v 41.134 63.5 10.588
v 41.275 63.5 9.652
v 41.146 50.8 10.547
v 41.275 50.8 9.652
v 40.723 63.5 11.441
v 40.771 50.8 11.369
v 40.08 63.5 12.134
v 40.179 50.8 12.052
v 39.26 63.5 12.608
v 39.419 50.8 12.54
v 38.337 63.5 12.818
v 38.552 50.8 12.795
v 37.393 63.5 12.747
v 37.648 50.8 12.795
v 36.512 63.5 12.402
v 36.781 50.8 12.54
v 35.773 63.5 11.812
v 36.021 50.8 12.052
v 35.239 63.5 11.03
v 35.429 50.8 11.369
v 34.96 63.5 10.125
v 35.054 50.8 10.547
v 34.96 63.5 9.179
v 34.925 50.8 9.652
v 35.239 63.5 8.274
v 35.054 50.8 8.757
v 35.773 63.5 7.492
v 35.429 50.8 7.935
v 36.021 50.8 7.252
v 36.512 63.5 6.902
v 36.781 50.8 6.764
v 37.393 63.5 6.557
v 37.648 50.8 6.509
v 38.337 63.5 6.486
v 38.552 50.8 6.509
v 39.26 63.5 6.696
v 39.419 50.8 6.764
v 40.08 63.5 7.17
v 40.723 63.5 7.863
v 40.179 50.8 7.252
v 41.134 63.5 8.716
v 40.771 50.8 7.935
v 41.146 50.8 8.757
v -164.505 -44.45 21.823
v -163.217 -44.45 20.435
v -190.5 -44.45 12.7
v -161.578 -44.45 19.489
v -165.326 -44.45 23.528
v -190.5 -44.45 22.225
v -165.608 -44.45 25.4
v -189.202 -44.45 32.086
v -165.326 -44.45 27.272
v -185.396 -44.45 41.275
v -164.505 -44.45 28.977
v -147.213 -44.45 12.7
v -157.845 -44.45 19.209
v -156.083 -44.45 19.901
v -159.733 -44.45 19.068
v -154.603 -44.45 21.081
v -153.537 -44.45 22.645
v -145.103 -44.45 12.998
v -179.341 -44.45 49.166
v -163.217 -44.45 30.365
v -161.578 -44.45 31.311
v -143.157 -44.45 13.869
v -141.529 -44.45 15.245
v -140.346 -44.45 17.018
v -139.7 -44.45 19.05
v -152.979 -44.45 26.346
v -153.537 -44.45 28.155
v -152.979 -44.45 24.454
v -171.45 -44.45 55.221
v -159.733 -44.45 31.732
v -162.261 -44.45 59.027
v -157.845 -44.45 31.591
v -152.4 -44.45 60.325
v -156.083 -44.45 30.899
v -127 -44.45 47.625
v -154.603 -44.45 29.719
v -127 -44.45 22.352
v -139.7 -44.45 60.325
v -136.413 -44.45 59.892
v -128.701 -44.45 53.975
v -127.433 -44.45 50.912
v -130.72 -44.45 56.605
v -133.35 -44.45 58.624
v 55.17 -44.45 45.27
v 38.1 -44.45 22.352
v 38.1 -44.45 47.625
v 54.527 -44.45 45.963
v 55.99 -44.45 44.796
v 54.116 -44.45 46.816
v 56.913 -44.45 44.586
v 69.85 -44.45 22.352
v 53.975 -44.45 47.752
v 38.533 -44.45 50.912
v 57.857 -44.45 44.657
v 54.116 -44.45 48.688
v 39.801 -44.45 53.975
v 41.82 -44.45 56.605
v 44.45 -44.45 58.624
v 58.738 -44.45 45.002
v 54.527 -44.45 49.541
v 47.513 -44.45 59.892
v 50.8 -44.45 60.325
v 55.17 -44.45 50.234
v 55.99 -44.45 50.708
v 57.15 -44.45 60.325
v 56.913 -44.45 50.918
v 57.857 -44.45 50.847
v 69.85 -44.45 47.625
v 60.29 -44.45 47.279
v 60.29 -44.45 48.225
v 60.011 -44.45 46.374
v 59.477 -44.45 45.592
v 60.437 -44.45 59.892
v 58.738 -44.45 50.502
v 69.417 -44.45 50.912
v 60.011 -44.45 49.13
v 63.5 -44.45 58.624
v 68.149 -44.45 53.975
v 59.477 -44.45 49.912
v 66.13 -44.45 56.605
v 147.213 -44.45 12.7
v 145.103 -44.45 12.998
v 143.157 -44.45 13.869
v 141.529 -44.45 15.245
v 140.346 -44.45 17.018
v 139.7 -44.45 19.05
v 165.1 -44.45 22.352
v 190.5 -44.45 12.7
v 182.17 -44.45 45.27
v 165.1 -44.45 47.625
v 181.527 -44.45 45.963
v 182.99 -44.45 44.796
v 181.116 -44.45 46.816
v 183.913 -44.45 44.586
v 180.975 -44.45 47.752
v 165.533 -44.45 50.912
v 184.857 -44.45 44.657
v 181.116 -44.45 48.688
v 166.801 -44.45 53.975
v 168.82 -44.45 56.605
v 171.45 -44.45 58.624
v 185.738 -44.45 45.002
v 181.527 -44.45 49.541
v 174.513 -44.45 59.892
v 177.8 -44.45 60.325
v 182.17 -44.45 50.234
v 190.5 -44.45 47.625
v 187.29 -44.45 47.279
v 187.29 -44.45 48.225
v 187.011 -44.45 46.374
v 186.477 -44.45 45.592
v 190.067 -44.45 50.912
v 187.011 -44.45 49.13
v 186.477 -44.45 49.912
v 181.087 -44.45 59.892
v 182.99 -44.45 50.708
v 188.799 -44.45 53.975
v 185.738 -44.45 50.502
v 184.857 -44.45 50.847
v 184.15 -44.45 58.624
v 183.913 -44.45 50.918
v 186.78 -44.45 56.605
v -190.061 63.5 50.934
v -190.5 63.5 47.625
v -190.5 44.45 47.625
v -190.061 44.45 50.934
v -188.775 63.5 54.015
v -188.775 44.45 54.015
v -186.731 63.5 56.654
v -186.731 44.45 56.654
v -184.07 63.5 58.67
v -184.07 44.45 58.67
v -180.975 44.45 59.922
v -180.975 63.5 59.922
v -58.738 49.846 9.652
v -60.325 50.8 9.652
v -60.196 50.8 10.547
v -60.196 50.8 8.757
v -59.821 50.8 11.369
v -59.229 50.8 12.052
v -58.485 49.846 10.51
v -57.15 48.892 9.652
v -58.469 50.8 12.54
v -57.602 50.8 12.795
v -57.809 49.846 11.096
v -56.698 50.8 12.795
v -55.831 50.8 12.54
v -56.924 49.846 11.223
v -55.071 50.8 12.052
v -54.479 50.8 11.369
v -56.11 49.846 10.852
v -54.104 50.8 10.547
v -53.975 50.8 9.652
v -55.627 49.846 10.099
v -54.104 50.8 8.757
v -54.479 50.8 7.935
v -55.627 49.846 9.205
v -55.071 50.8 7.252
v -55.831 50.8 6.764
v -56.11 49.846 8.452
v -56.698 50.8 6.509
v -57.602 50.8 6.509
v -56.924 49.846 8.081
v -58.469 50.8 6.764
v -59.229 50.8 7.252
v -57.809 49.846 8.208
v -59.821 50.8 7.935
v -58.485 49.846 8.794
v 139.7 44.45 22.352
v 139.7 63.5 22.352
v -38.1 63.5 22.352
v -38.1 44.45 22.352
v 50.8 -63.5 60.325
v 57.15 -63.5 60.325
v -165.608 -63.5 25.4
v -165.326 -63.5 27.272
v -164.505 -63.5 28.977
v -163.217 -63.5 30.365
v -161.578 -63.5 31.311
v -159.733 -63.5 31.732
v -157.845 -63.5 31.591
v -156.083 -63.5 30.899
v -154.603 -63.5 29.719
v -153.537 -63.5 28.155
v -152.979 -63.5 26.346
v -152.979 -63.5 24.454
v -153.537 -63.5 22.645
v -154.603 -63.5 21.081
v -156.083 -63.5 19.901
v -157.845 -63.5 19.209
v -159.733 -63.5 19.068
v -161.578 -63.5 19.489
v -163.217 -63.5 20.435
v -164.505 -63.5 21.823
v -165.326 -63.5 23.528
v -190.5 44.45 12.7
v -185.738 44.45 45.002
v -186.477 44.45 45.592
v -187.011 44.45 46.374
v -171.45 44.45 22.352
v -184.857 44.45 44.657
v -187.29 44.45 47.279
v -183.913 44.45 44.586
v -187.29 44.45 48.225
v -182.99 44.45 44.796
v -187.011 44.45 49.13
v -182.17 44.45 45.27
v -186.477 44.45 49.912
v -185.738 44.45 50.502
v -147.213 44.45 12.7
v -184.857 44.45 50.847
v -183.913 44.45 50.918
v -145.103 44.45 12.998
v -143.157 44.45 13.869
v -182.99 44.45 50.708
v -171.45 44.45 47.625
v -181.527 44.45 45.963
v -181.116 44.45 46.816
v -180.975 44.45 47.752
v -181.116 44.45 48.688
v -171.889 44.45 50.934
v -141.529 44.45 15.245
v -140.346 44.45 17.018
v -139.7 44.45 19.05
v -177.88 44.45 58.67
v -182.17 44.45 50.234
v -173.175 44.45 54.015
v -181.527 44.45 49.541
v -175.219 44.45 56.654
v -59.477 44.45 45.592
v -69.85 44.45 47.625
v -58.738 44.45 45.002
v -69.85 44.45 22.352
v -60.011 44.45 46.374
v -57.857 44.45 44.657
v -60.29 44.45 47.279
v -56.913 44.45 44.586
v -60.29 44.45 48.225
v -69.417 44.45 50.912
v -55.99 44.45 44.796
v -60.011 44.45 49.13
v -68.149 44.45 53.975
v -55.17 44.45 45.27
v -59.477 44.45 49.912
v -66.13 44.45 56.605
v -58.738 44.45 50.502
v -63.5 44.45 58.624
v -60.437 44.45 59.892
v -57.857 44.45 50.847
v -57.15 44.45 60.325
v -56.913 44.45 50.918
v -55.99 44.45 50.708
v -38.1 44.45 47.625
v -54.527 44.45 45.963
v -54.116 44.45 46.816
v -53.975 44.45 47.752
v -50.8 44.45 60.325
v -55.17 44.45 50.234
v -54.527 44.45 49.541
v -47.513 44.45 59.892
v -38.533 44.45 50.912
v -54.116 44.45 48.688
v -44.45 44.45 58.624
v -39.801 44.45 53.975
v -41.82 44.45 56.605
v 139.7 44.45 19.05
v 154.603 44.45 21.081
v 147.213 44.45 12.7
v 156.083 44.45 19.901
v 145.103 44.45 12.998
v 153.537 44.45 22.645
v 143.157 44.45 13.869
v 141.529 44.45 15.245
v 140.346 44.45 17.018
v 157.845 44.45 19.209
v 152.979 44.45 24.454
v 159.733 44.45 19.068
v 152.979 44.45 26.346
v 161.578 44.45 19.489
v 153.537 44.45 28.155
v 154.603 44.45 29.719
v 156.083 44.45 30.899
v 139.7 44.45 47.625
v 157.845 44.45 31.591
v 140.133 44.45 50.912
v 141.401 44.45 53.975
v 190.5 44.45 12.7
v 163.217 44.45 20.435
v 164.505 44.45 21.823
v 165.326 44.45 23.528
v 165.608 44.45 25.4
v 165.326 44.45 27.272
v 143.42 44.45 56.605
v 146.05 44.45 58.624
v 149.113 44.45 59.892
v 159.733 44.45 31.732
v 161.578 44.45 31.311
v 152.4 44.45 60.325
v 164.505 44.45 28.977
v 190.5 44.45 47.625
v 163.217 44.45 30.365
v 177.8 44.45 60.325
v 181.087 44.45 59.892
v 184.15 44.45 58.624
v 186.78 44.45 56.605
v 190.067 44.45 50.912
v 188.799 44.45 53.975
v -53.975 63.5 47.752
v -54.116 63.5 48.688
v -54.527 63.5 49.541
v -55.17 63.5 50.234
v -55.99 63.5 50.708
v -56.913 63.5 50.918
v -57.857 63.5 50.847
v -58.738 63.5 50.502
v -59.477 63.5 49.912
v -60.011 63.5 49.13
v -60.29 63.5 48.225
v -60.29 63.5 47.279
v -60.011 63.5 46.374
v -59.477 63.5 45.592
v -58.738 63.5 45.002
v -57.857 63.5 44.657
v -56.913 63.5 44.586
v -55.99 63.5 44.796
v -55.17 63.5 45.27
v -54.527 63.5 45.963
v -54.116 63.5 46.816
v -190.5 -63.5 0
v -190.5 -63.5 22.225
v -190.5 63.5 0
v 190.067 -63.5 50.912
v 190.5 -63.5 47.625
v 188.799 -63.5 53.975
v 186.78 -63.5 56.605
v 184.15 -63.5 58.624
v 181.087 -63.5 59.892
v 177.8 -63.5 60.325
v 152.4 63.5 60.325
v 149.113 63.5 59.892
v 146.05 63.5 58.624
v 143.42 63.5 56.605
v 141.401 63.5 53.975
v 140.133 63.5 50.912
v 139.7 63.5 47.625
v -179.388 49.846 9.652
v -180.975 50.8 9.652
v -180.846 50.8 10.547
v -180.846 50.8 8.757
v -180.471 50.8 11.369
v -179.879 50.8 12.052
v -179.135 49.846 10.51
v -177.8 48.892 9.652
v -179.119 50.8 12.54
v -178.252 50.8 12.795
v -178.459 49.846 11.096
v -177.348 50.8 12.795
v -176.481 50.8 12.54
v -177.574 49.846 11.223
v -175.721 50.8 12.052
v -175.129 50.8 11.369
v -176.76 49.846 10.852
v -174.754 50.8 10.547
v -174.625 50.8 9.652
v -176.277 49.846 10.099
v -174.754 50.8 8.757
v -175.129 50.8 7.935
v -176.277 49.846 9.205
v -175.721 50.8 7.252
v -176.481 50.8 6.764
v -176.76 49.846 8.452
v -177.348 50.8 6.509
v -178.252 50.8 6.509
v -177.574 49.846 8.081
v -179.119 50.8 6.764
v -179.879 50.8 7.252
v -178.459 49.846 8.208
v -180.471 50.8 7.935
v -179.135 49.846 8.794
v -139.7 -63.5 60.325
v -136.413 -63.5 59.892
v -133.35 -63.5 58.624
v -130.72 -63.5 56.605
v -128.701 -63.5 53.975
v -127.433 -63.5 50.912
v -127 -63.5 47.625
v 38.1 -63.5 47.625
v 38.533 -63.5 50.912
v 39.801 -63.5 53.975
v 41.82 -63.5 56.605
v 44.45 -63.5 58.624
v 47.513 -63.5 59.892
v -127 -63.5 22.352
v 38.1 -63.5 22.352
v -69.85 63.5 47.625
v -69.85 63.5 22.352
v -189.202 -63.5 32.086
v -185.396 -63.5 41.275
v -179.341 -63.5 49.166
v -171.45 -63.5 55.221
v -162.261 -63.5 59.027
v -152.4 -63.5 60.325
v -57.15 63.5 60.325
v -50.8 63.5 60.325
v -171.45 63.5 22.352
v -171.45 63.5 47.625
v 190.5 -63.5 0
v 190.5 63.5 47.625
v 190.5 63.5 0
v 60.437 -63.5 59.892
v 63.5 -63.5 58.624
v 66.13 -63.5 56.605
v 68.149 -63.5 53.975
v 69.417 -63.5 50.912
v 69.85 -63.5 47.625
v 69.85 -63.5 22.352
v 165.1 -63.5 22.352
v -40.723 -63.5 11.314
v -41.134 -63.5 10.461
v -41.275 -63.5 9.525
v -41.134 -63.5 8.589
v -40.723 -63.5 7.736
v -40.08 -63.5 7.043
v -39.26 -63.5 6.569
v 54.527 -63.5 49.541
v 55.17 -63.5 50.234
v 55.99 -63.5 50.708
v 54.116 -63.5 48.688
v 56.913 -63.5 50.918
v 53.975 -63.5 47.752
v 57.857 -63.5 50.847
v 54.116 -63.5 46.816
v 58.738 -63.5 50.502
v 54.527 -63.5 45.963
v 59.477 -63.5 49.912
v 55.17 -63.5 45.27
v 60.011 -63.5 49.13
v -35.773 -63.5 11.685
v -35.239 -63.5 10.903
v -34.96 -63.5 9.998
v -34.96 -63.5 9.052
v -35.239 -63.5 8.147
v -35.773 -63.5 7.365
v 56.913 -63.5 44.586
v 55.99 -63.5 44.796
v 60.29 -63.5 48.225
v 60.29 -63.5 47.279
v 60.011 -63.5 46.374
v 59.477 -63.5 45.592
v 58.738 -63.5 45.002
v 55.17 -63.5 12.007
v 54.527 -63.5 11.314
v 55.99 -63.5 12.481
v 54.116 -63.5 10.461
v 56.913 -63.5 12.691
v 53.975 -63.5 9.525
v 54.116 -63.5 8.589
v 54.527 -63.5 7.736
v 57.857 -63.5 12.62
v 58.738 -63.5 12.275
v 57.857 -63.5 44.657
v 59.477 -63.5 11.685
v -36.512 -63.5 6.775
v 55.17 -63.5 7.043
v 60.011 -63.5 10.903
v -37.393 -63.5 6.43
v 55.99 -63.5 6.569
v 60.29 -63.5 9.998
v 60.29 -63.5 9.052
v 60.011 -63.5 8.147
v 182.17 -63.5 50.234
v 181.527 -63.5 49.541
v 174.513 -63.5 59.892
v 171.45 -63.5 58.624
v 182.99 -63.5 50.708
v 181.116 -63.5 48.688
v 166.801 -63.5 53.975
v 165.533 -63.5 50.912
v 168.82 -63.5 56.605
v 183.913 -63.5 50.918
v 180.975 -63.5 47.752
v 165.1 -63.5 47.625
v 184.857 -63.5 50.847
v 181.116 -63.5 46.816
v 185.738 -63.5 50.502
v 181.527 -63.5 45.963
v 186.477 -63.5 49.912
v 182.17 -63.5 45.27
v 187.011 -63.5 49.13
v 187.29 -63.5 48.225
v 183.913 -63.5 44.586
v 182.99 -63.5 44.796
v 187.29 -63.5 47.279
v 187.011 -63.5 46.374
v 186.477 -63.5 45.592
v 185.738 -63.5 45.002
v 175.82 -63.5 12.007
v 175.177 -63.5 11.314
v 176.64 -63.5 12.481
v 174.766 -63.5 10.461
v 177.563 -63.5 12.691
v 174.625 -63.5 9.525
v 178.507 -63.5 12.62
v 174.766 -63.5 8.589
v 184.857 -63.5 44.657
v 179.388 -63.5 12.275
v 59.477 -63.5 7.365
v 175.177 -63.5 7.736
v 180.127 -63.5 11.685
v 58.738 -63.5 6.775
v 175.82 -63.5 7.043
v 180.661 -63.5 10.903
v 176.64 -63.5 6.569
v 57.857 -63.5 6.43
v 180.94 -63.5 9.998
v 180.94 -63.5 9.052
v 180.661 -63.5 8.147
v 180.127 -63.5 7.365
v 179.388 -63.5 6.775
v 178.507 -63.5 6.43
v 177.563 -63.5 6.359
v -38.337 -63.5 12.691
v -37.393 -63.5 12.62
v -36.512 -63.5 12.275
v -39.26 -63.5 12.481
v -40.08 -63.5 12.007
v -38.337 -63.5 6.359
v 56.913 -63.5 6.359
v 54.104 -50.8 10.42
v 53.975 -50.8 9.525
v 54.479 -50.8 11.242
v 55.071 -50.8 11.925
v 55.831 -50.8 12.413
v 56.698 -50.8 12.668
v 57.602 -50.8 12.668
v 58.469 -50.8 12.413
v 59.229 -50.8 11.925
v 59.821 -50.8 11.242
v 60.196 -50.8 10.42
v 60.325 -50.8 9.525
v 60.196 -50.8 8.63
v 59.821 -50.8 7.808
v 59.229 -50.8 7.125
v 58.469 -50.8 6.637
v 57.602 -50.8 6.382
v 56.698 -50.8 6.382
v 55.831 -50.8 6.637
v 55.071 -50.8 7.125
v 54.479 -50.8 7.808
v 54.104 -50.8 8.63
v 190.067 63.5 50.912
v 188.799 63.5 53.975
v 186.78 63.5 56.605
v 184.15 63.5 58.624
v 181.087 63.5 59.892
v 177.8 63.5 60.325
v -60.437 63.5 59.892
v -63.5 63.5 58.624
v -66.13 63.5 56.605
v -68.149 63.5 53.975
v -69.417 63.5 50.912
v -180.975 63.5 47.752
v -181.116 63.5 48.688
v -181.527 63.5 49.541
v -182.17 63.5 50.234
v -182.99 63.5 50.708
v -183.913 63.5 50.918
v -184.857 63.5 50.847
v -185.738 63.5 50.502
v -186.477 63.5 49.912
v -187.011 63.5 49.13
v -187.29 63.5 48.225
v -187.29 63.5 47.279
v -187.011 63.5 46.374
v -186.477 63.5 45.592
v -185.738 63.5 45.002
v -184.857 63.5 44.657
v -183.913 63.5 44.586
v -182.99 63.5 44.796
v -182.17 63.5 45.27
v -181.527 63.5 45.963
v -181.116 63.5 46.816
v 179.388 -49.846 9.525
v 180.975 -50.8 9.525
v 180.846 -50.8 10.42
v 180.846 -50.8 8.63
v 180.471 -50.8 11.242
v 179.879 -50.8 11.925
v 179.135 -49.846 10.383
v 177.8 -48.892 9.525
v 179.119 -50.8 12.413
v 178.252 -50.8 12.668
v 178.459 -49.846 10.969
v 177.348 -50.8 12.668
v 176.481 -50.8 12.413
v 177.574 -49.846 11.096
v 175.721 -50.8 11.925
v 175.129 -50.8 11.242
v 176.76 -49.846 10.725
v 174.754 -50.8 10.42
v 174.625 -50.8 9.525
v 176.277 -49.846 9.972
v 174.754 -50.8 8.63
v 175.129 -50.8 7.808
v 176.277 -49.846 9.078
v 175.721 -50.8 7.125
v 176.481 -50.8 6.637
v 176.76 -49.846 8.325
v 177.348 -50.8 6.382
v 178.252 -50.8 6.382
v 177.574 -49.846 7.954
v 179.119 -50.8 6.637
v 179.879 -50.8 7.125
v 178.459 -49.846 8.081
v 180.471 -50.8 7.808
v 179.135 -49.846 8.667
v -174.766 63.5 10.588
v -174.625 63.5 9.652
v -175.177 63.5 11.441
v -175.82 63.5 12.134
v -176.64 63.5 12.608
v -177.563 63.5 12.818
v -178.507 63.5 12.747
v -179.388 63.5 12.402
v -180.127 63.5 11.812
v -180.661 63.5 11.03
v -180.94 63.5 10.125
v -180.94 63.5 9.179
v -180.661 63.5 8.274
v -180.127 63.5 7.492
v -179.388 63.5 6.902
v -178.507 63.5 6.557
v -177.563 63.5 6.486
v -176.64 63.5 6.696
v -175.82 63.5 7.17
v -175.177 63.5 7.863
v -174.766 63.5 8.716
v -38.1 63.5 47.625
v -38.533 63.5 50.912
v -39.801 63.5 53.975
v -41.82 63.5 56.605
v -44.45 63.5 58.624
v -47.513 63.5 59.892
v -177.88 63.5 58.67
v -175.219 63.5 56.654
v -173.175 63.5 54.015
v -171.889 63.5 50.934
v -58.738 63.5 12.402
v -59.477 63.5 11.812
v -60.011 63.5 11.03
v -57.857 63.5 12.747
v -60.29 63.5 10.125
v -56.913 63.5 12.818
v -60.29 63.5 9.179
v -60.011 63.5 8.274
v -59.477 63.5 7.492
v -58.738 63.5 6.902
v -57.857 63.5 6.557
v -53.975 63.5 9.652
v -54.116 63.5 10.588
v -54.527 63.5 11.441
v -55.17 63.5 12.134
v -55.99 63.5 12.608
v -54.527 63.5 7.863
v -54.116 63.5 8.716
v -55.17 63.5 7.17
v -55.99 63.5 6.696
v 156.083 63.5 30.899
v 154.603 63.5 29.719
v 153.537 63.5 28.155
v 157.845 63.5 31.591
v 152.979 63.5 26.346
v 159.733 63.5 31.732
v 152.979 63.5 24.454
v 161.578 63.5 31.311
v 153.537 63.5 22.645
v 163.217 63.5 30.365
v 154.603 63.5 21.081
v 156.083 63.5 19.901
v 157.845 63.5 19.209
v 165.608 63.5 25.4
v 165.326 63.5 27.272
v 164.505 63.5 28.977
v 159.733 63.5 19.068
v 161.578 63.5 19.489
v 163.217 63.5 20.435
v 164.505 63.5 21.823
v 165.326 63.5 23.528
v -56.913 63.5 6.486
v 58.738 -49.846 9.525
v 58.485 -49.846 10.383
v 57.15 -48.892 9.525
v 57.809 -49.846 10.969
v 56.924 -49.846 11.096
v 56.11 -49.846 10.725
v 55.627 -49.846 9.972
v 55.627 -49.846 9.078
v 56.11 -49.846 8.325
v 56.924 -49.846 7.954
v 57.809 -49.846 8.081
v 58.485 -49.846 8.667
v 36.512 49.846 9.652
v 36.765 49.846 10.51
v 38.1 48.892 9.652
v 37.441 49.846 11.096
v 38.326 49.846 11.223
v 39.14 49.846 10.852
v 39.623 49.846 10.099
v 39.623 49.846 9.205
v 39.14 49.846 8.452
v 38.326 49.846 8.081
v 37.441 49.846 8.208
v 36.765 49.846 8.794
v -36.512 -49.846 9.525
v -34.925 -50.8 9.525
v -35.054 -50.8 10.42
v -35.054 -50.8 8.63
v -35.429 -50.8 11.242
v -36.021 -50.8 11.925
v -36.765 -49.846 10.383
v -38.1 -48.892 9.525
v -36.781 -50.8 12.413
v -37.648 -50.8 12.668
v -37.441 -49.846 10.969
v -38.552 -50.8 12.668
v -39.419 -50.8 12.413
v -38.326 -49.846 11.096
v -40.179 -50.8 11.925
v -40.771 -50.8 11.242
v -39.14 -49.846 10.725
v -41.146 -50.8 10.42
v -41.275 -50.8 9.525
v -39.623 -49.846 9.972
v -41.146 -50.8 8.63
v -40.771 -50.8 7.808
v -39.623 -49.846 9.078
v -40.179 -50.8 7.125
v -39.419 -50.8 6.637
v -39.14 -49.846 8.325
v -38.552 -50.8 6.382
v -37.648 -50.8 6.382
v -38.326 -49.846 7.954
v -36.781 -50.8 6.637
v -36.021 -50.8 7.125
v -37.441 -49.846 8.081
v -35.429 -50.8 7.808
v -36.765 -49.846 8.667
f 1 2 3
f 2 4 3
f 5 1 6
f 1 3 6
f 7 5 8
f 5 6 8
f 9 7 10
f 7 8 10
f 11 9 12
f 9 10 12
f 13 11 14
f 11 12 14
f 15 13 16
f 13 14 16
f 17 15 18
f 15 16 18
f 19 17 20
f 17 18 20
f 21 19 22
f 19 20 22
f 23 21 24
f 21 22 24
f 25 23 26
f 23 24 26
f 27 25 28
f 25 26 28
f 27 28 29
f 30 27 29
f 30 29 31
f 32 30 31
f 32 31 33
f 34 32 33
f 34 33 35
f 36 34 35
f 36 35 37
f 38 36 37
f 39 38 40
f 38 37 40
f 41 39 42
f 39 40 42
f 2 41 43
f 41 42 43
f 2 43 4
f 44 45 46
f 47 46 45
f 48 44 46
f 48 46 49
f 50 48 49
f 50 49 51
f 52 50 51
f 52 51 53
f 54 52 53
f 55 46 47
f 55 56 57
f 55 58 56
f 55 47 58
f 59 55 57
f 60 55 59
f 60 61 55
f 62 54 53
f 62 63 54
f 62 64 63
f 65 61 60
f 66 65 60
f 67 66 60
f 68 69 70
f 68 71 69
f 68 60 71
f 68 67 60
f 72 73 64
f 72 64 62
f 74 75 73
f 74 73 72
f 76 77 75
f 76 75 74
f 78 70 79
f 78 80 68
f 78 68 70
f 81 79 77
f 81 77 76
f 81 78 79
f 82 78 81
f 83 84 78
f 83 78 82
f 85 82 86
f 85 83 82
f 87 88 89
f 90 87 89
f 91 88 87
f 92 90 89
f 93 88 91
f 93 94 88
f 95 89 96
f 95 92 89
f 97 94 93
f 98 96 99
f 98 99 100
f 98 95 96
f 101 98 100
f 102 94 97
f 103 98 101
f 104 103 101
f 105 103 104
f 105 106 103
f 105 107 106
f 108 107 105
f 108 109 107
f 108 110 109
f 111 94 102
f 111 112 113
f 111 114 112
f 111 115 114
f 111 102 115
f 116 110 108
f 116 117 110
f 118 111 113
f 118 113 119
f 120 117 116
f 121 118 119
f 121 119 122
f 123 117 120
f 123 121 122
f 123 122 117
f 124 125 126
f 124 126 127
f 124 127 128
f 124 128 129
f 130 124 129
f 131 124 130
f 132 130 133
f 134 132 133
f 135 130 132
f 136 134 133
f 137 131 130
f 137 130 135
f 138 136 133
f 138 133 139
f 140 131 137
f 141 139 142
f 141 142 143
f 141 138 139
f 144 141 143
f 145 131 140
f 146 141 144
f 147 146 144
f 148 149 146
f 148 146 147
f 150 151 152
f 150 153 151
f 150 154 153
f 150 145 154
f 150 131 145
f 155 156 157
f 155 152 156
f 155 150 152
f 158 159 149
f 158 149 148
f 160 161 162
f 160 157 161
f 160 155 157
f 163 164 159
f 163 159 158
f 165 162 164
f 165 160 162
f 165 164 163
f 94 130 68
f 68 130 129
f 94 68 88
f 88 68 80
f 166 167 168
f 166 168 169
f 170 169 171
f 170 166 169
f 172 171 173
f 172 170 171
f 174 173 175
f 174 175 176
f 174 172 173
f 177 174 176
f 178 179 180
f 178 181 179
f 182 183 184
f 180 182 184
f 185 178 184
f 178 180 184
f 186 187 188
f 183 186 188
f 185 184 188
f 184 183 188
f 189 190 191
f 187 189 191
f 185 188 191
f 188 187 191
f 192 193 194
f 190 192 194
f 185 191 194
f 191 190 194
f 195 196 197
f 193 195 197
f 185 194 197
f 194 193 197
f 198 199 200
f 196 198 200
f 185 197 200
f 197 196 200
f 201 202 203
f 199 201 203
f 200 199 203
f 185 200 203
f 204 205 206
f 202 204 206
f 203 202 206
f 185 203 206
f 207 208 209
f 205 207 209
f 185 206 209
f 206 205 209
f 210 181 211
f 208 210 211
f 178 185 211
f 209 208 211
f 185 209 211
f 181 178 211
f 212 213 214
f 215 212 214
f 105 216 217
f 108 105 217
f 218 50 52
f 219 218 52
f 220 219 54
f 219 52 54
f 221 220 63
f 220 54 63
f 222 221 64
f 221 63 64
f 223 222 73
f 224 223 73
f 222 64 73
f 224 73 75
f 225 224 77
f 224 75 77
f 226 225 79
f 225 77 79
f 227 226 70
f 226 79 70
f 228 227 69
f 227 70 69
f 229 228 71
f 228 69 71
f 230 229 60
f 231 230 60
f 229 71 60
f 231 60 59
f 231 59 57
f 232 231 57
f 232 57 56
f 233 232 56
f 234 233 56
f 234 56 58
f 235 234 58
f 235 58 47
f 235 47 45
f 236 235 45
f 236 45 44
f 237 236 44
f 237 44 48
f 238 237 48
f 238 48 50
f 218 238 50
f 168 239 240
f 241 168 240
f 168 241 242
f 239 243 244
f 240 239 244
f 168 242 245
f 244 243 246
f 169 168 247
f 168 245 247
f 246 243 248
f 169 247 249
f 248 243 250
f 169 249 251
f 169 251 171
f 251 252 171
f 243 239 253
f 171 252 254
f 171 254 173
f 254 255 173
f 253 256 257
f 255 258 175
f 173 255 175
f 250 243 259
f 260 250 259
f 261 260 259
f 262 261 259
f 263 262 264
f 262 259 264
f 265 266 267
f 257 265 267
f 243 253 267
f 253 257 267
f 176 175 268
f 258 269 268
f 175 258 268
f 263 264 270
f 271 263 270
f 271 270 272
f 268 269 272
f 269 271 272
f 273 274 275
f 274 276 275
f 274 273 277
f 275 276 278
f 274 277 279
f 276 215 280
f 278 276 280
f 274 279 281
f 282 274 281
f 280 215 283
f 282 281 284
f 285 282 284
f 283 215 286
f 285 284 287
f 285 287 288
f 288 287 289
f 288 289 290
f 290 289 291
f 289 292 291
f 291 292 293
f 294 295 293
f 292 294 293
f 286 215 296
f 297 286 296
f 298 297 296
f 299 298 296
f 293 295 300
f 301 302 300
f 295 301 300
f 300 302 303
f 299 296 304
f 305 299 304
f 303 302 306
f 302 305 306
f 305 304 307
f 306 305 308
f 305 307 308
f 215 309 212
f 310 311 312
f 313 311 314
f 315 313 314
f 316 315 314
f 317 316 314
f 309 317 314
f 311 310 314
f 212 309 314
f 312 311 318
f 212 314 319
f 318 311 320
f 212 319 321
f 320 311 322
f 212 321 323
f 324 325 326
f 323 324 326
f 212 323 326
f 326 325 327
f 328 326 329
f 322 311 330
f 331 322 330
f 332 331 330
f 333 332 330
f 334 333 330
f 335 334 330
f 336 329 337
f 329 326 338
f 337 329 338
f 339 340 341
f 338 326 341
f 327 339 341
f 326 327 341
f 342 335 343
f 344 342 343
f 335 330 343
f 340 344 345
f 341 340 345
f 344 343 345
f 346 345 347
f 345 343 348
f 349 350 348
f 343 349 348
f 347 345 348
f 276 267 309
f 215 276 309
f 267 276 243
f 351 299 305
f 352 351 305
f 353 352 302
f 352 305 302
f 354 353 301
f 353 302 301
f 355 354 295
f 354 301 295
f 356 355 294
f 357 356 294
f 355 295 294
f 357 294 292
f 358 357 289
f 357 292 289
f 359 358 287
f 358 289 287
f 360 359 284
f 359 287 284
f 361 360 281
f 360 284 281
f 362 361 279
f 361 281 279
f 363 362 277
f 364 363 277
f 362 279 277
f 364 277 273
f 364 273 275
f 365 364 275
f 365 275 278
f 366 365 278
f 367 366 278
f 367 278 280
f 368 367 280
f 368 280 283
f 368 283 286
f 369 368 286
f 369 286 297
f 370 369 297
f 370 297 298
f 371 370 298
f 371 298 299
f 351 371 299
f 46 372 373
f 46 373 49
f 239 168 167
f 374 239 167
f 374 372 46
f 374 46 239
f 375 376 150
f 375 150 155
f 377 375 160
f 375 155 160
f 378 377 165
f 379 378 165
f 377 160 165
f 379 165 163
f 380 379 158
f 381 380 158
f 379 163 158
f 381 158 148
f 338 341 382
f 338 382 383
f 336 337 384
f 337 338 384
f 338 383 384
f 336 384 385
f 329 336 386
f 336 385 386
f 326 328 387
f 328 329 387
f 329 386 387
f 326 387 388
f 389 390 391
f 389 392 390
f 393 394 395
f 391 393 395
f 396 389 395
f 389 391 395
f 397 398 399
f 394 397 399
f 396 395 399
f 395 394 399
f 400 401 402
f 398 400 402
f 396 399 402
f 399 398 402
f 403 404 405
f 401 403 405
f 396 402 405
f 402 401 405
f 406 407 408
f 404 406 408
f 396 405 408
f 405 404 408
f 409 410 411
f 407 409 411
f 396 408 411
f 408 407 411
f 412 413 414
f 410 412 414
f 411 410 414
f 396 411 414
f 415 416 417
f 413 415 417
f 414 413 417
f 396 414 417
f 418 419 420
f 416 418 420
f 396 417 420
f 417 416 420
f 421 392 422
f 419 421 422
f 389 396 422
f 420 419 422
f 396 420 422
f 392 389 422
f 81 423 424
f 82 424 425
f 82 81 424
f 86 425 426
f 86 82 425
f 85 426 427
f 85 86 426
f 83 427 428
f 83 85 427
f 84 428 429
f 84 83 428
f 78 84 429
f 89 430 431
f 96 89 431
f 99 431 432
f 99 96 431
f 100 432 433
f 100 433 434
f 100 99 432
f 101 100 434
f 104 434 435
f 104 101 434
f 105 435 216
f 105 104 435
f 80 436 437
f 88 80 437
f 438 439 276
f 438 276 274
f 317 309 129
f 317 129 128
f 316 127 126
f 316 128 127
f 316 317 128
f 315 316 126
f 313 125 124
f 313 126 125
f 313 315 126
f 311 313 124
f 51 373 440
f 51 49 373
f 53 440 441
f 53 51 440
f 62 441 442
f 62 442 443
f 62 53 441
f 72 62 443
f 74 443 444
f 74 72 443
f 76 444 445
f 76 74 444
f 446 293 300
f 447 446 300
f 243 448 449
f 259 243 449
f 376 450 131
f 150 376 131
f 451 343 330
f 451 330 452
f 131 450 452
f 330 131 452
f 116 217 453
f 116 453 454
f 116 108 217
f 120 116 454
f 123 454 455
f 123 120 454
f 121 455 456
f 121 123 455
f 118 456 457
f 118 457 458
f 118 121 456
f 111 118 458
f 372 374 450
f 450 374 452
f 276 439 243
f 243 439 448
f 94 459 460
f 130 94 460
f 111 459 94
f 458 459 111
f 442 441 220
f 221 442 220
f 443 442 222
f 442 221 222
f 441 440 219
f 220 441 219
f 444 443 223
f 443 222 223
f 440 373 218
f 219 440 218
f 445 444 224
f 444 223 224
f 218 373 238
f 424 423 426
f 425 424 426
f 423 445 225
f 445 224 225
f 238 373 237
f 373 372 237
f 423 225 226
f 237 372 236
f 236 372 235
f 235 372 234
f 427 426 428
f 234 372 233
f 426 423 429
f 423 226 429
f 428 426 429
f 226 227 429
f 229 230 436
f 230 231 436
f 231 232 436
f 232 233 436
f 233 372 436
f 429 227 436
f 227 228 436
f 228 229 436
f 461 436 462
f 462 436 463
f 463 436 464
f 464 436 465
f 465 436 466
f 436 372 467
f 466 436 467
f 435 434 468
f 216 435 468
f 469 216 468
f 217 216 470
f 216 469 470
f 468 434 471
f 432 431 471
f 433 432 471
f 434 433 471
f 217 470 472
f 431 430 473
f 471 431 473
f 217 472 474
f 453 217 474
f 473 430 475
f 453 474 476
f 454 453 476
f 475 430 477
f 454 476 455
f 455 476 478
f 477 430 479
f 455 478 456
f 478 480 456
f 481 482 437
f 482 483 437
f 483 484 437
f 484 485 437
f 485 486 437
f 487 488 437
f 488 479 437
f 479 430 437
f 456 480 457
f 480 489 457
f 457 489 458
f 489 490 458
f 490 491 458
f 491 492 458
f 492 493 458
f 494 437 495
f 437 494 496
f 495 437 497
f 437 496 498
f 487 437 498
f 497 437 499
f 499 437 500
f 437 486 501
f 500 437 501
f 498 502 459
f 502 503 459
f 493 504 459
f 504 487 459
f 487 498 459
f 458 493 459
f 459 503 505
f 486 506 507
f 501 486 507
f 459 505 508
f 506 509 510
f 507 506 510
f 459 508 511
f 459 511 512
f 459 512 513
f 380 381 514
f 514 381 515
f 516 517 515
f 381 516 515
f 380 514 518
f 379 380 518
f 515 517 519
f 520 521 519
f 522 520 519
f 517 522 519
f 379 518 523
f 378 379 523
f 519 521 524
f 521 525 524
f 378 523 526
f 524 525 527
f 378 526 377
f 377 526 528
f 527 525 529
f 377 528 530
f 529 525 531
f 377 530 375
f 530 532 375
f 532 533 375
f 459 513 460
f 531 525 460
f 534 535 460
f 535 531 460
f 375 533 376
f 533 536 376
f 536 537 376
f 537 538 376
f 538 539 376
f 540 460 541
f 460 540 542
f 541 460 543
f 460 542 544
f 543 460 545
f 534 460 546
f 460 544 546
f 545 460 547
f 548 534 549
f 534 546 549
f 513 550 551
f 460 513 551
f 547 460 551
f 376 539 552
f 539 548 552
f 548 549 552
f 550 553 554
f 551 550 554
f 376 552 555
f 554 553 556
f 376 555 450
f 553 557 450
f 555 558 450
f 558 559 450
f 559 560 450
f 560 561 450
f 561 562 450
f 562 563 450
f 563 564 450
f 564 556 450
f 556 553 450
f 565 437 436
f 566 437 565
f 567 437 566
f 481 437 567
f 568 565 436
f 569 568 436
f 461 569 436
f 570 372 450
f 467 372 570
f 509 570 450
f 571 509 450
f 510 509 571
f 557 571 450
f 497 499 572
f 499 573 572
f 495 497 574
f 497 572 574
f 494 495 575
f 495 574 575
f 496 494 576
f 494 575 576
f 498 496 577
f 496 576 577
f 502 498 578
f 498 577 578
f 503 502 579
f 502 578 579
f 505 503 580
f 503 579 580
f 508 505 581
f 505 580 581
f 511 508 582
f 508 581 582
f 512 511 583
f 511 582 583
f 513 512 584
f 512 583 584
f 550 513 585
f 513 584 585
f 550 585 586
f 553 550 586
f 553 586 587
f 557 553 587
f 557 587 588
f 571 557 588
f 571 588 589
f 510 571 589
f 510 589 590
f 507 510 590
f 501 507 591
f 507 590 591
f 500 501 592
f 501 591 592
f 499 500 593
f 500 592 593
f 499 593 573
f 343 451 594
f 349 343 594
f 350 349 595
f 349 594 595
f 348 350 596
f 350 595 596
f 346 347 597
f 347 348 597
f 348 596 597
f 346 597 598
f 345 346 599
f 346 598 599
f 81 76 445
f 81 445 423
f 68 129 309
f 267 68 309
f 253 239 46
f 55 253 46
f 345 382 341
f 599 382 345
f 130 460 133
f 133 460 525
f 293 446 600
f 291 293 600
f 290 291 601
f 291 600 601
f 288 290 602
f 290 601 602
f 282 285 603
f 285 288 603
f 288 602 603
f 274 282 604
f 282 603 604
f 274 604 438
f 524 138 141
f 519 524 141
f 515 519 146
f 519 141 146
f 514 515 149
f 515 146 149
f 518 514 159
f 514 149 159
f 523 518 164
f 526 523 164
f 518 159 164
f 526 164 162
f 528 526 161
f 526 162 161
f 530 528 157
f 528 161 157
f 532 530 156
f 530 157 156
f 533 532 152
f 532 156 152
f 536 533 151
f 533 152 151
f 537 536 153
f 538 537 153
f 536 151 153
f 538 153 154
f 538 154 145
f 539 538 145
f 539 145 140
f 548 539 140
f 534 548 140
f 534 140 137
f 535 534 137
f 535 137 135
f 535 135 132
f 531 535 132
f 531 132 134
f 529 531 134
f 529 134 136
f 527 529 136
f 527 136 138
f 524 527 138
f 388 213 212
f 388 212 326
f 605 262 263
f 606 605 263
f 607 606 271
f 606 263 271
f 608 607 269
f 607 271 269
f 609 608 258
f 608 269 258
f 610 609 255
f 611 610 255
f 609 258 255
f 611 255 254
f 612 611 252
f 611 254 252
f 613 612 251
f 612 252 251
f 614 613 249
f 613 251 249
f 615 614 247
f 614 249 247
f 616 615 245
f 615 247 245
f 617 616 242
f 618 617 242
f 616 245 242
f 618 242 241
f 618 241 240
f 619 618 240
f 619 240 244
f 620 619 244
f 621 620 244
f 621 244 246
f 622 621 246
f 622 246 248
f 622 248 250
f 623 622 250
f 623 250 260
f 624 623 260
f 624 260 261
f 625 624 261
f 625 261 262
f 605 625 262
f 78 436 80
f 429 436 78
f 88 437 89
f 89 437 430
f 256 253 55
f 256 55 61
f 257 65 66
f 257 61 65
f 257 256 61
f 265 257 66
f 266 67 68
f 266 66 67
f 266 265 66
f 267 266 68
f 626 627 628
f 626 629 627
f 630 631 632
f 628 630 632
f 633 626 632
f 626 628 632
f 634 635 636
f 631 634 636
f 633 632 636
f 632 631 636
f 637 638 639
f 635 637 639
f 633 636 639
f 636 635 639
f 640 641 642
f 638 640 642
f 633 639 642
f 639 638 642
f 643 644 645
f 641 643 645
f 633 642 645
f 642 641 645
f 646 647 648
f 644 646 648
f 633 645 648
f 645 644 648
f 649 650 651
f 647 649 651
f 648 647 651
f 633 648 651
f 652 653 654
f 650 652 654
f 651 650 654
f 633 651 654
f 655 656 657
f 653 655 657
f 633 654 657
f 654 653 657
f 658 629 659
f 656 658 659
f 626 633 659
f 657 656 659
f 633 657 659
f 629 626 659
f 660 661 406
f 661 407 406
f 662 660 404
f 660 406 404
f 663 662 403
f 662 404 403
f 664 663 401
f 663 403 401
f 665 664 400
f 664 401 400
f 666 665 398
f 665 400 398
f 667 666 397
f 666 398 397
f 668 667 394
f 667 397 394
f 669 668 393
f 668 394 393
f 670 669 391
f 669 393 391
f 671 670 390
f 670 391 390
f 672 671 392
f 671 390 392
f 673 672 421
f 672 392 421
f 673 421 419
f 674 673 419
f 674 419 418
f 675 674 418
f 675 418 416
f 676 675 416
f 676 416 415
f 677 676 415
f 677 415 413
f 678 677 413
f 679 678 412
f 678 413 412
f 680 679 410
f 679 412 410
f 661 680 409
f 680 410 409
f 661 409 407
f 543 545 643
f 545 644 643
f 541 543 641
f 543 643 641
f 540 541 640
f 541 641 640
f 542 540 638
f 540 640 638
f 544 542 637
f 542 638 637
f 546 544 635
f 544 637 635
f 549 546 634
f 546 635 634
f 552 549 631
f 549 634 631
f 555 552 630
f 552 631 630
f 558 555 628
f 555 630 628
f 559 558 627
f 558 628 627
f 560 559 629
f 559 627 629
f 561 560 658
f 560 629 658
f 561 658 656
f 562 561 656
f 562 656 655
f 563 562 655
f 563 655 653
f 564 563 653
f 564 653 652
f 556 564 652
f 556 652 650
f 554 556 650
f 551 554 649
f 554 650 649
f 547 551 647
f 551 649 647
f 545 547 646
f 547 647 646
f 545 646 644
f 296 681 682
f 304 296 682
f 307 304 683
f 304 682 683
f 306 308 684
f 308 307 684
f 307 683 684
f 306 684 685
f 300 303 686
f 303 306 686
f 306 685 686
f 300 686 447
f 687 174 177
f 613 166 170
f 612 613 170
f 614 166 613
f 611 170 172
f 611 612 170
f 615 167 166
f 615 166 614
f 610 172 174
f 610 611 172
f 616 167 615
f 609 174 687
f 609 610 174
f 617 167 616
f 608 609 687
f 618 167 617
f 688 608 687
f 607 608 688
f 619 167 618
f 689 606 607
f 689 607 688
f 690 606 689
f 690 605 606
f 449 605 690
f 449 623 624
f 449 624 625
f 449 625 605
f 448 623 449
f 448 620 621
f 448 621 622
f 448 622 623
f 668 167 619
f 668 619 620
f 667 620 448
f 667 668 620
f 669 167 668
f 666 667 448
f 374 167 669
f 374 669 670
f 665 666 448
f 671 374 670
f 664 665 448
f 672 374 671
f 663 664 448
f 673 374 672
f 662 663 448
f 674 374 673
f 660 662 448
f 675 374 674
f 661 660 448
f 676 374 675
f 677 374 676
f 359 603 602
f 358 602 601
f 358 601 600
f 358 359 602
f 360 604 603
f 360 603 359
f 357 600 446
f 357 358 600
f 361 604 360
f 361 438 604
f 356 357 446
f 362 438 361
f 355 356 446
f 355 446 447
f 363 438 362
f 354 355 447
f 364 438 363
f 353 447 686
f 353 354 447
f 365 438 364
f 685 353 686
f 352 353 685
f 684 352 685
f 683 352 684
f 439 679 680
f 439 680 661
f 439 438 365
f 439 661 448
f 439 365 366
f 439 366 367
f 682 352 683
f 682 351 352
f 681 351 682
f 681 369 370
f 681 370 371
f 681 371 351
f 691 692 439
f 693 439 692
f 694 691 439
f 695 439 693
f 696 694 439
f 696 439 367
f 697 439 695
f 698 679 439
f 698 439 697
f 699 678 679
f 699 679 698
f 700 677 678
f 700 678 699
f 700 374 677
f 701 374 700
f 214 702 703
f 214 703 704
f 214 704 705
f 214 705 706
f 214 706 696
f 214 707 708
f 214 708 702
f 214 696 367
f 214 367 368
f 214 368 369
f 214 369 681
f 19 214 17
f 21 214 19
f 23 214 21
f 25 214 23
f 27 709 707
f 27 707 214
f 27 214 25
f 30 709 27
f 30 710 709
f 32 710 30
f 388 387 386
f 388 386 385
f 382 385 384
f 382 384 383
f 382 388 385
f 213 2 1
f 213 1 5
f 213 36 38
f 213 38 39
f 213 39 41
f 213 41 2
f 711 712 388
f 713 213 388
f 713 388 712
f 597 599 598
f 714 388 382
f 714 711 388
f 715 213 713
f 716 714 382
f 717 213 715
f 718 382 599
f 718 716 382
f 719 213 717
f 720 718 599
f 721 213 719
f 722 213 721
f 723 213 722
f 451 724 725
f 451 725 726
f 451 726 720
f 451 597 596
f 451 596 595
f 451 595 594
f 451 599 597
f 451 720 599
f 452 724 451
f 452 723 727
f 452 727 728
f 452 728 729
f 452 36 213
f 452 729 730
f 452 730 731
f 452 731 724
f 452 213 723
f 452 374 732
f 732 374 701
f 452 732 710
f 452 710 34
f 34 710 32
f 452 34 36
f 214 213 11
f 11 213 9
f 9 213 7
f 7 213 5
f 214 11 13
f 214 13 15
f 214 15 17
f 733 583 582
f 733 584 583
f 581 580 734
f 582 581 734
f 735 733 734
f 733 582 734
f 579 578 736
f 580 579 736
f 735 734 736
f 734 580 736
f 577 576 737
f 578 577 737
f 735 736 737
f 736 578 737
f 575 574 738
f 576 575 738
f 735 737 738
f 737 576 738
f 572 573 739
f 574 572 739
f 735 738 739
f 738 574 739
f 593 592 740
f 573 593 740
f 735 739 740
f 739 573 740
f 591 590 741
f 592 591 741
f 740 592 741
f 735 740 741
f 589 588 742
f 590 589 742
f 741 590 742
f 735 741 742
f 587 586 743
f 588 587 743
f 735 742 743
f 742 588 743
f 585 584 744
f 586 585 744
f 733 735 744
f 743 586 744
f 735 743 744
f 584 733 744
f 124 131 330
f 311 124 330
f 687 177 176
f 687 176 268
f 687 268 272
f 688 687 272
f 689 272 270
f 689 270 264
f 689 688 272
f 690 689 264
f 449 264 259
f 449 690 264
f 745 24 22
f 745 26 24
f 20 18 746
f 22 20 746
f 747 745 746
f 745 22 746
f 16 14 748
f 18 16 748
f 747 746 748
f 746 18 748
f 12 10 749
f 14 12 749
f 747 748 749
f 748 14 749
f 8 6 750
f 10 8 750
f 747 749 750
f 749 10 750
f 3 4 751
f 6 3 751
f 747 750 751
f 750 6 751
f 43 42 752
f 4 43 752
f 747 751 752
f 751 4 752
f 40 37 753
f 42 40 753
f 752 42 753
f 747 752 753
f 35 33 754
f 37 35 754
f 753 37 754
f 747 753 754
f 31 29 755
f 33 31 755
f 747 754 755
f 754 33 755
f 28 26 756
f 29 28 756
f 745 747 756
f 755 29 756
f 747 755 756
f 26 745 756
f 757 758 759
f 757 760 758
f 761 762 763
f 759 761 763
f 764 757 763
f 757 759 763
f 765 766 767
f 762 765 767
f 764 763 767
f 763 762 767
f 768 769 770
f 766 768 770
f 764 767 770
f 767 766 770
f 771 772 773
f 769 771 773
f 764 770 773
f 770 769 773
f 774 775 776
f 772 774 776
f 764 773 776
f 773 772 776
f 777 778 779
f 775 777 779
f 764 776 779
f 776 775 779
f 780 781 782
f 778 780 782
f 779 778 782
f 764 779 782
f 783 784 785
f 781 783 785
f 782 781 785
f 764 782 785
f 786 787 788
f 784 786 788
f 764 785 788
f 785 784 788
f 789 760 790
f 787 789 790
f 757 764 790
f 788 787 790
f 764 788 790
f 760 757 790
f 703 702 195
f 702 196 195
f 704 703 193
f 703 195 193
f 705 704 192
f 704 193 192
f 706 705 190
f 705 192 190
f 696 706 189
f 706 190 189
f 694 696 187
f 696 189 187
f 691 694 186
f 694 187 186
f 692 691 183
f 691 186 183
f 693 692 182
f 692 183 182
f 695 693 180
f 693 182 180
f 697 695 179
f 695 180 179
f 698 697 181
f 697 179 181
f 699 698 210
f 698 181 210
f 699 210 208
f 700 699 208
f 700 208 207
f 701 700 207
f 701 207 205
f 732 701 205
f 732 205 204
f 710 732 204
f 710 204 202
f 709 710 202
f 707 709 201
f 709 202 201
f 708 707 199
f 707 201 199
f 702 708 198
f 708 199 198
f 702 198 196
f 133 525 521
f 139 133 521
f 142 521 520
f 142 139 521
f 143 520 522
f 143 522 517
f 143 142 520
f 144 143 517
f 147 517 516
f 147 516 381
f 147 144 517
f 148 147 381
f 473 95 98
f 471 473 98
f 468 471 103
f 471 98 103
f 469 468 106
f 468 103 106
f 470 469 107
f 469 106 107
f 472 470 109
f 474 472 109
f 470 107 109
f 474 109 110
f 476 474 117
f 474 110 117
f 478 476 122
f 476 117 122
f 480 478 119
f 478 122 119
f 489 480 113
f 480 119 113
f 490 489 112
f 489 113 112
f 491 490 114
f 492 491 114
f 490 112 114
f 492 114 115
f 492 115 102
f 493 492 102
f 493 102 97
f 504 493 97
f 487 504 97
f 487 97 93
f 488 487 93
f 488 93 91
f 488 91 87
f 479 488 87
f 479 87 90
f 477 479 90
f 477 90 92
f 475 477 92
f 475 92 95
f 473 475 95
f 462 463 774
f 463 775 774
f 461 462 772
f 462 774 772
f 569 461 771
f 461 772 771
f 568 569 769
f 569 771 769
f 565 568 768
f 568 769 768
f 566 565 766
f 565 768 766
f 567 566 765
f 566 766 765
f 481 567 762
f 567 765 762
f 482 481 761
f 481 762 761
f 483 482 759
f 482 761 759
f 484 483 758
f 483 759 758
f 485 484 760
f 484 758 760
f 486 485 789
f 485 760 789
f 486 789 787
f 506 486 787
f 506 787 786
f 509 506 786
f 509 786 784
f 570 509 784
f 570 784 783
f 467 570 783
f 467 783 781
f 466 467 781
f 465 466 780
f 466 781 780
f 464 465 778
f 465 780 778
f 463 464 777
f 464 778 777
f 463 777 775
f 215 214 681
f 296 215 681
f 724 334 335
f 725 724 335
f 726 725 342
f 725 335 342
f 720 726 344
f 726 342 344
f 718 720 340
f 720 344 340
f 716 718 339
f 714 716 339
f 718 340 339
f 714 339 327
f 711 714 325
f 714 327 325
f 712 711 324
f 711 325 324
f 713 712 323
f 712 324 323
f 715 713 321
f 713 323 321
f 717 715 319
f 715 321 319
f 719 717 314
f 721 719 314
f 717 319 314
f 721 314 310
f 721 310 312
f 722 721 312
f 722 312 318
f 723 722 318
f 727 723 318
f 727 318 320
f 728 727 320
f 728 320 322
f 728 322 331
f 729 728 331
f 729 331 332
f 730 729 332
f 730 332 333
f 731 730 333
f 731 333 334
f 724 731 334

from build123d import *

# Parameters (mm, degrees)
F0_W         = 381
F0_H         = 127
F1_DEPTH     = 60.325
F2_W         = 88.9
F2_H         = 41.275
F3_DEPTH     = 381
F4_W         = 88.9
F4_H         = 6.35
F5_DEPTH     = 50.8
F6_T1_DEPTH  = 126.4671066227
F7_W         = 88.9
F7_H         = 6.35
F8_DEPTH     = 50.8
F9_T1_DEPTH  = 126.4671066227
F10_W        = 165.1
F10_H        = 37.973
F10_W_2      = 95.25
F11_DEPTH    = 19.05
F12_W        = 177.8
F12_H        = 37.973
F12_W_2      = 101.6
F13_DEPTH    = 19.05
F14_R        = 38.1
F15_R        = 12.69999
F16_T1_DEPTH = 82.55
F18_D        = 6.35
F18_DEPTH    = 12.7
F18_TIP      = 1.9077324654
F19_D        = 6.35
F19_DEPTH    = 25.4
F19_TIP      = 1.9077324654
F20_D        = 12.7
F20_DEPTH    = 25.4
F20_TIP      = 3.8154649308
F22_D        = 12.7
F22_DEPTH    = 25.4
F22_TIP      = 3.8154649308
F23_D        = 6.35
F23_DEPTH    = 12.7
F23_TIP      = 1.9077324654
F24_D        = 6.35
F24_DEPTH    = 25.4
F24_TIP      = 1.9077324654


# Not quite as in the source:
# - a fillet or chamfer that OpenCascade refuses, or shapes differently, is made with other operations: its cross-section is extruded or revolved along the edge and cut away or added
# - a fillet or chamfer is up to 0.001 mm smaller than in the source, because OpenCascade refuses the exact size


with BuildPart() as f1:
    # F0 (on Top) → F1 (new body)
    with BuildSketch(Plane.XY):
        Rectangle(F0_W, F0_H)
    extrude(amount=F1_DEPTH)

    # F2 (on face) → F3 (cut, through all)
    with BuildSketch(Plane.YZ.offset(190.5)):
        with Locations((0, 39.6875)):
            Rectangle(F2_W, F2_H)
    extrude(amount=-F3_DEPTH, mode=Mode.SUBTRACT)

    # F4 (on face) → F5 (cut)
    with BuildSketch(Plane.YZ.offset(190.5)):
        with Locations((0, 15.875)):
            Rectangle(F4_W, F4_H)
    extrude(amount=-F5_DEPTH, mode=Mode.SUBTRACT)

    # F6: fillet of radius 7.62 on 1 edges, made by hand

    # F6_s2 → F6_t1 (join)
    with BuildSketch(Plane.XZ.offset(-63.2335533113)):
        with BuildLine():
            ThreePointArc((139.7, 19.05), (142.2947324749, 14.5001288674), (147.2134213245, 12.7))
            Line((147.2134213245, 12.7), (139.7, 12.7))
            Line((139.7, 12.7), (139.7, 19.05))
        make_face()
    extrude(amount=F6_T1_DEPTH)

    # F7 (on face) → F8 (cut)
    with BuildSketch(Plane(origin=(-190.5, 0, 0), x_dir=(0, -1, 0), z_dir=(-1, 0, 0))):
        with Locations((0, 15.875)):
            Rectangle(F7_W, F7_H)
    extrude(amount=-F8_DEPTH, mode=Mode.SUBTRACT)

    # F9: fillet of radius 7.62 on 1 edges, made by hand

    # F9_s2 → F9_t1 (join)
    with BuildSketch(Plane.XZ.offset(-63.2335533113)):
        with BuildLine():
            ThreePointArc((-147.2134213245, 12.7), (-142.2947324749, 14.5001288674), (-139.7, 19.05))
            Line((-139.7, 19.05), (-139.7, 12.7))
            Line((-139.7, 12.7), (-147.2134213245, 12.7))
        make_face()
    extrude(amount=F9_T1_DEPTH)

    # F10 (on face) → F11 (cut, through all)
    with BuildSketch(Plane.XZ.offset(63.5)):
        with Locations((-44.45, 41.3385)):
            Rectangle(F10_W, F10_H)
        with Locations((117.475, 41.3385)):
            Rectangle(F10_W_2, F10_H)
    extrude(amount=-F11_DEPTH, mode=Mode.SUBTRACT)

    # F12 (on face) → F13 (cut, through all)
    with BuildSketch(Plane(origin=(0, 63.5, 0), x_dir=(-1, 0, 0), z_dir=(0, 1, 0))):
        with Locations((-50.8, 41.3385)):
            Rectangle(F12_W, F12_H)
        with Locations((120.65, 41.3385)):
            Rectangle(F12_W_2, F12_H)
    extrude(amount=-F13_DEPTH, mode=Mode.SUBTRACT)

    # F14
    f14_edges = [f1.edges().sort_by_distance(p)[0] for p in [
        (-190.5, -53.975, 60.325),
    ]]
    fillet(f14_edges, radius=F14_R)

    # F15 (radius 12.7 in the source; OpenCascade refuses exactly that, so slightly less here)
    f15_edges = [f1.edges().sort_by_distance(p)[0] for p in [
        (-127, -53.975, 60.325),
        (38.1, -53.975, 60.325),
        (69.85, -53.975, 60.325),
        (165.1, -53.975, 60.325),
        (190.5, -53.975, 60.325),
    ]]
    fillet(f15_edges, radius=F15_R)

    # F16: fillet of radius 12.7 on 6 edges, made by hand

    # F16_s2 → F16_t1 (cut)
    with BuildSketch(Plane.XZ.offset(-95.25)):
        with BuildLine():
            ThreePointArc((-184.15, 60.325), (-175.1697438789, 56.6052561211), (-171.45, 47.625))
            Line((-171.45, 47.625), (-171.45, 60.325))
            Line((-171.45, 60.325), (-184.15, 60.325))
        make_face()
        with BuildLine():
            ThreePointArc((-190.5, 47.625), (-186.7802561211, 56.6052561211), (-177.8, 60.325))
            Line((-177.8, 60.325), (-190.5, 60.325))
            Line((-190.5, 60.325), (-190.5, 47.625))
        make_face()
        with BuildLine():
            ThreePointArc((-57.15, 60.325), (-66.1302561211, 56.6052561211), (-69.85, 47.625))
            Line((-69.85, 47.625), (-69.85, 60.325))
            Line((-69.85, 60.325), (-57.15, 60.325))
        make_face()
        with BuildLine():
            ThreePointArc((-38.1, 47.625), (-41.8197438789, 56.6052561211), (-50.8, 60.325))
            Line((-50.8, 60.325), (-38.1, 60.325))
            Line((-38.1, 60.325), (-38.1, 47.625))
        make_face()
        with BuildLine():
            ThreePointArc((152.4, 60.325), (143.4197438789, 56.6052561211), (139.7, 47.625))
            Line((139.7, 47.625), (139.7, 60.325))
            Line((139.7, 60.325), (152.4, 60.325))
        make_face()
        with BuildLine():
            ThreePointArc((190.5, 47.625), (186.7802561211, 56.6052561211), (177.8, 60.325))
            Line((177.8, 60.325), (190.5, 60.325))
            Line((190.5, 60.325), (190.5, 47.625))
        make_face()
    extrude(amount=F16_T1_DEPTH, mode=Mode.SUBTRACT)

    # F18
    with Locations(Plane.XZ.offset(63.5)):
        with Locations((-38.1, 9.525), (57.15, 9.525), (177.8, 9.525)):
            Hole(F18_D / 2, depth=F18_DEPTH)
            with Locations((0, 0, -(F18_DEPTH + F18_TIP / 2))):  # 118° drill point
                Cone(0, F18_D / 2, F18_TIP, mode=Mode.SUBTRACT)

    # F19
    with Locations(Plane.XZ.offset(63.5)):
        with Locations((57.15, 47.752), (184.15, 47.752)):
            Hole(F19_D / 2, depth=F19_DEPTH)
            with Locations((0, 0, -(F19_DEPTH + F19_TIP / 2))):  # 118° drill point
                Cone(0, F19_D / 2, F19_TIP, mode=Mode.SUBTRACT)

    # F20
    with Locations(Plane.XZ.offset(63.5)):
        with Locations((-159.258, 25.4)):
            Hole(F20_D / 2, depth=F20_DEPTH)
            with Locations((0, 0, -(F20_DEPTH + F20_TIP / 2))):  # 118° drill point
                Cone(0, F20_D / 2, F20_TIP, mode=Mode.SUBTRACT)

    # F22
    with Locations(Plane(origin=(0, 63.5, 0), x_dir=(-1, 0, 0), z_dir=(0, 1, 0))):
        with Locations((-159.258, 25.4)):
            Hole(F22_D / 2, depth=F22_DEPTH)
            with Locations((0, 0, -(F22_DEPTH + F22_TIP / 2))):  # 118° drill point
                Cone(0, F22_D / 2, F22_TIP, mode=Mode.SUBTRACT)

    # F23
    with Locations(Plane(origin=(0, 63.5, 0), x_dir=(-1, 0, 0), z_dir=(0, 1, 0))):
        with Locations((-38.1, 9.652), (57.15, 9.652), (177.8, 9.652)):
            Hole(F23_D / 2, depth=F23_DEPTH)
            with Locations((0, 0, -(F23_DEPTH + F23_TIP / 2))):  # 118° drill point
                Cone(0, F23_D / 2, F23_TIP, mode=Mode.SUBTRACT)

    # F24
    with Locations(Plane(origin=(0, 63.5, 0), x_dir=(-1, 0, 0), z_dir=(0, 1, 0))):
        with Locations((57.15, 47.752), (184.15, 47.752)):
            Hole(F24_D / 2, depth=F24_DEPTH)
            with Locations((0, 0, -(F24_DEPTH + F24_TIP / 2))):  # 118° drill point
                Cone(0, F24_D / 2, F24_TIP, mode=Mode.SUBTRACT)


solid = f1.part
